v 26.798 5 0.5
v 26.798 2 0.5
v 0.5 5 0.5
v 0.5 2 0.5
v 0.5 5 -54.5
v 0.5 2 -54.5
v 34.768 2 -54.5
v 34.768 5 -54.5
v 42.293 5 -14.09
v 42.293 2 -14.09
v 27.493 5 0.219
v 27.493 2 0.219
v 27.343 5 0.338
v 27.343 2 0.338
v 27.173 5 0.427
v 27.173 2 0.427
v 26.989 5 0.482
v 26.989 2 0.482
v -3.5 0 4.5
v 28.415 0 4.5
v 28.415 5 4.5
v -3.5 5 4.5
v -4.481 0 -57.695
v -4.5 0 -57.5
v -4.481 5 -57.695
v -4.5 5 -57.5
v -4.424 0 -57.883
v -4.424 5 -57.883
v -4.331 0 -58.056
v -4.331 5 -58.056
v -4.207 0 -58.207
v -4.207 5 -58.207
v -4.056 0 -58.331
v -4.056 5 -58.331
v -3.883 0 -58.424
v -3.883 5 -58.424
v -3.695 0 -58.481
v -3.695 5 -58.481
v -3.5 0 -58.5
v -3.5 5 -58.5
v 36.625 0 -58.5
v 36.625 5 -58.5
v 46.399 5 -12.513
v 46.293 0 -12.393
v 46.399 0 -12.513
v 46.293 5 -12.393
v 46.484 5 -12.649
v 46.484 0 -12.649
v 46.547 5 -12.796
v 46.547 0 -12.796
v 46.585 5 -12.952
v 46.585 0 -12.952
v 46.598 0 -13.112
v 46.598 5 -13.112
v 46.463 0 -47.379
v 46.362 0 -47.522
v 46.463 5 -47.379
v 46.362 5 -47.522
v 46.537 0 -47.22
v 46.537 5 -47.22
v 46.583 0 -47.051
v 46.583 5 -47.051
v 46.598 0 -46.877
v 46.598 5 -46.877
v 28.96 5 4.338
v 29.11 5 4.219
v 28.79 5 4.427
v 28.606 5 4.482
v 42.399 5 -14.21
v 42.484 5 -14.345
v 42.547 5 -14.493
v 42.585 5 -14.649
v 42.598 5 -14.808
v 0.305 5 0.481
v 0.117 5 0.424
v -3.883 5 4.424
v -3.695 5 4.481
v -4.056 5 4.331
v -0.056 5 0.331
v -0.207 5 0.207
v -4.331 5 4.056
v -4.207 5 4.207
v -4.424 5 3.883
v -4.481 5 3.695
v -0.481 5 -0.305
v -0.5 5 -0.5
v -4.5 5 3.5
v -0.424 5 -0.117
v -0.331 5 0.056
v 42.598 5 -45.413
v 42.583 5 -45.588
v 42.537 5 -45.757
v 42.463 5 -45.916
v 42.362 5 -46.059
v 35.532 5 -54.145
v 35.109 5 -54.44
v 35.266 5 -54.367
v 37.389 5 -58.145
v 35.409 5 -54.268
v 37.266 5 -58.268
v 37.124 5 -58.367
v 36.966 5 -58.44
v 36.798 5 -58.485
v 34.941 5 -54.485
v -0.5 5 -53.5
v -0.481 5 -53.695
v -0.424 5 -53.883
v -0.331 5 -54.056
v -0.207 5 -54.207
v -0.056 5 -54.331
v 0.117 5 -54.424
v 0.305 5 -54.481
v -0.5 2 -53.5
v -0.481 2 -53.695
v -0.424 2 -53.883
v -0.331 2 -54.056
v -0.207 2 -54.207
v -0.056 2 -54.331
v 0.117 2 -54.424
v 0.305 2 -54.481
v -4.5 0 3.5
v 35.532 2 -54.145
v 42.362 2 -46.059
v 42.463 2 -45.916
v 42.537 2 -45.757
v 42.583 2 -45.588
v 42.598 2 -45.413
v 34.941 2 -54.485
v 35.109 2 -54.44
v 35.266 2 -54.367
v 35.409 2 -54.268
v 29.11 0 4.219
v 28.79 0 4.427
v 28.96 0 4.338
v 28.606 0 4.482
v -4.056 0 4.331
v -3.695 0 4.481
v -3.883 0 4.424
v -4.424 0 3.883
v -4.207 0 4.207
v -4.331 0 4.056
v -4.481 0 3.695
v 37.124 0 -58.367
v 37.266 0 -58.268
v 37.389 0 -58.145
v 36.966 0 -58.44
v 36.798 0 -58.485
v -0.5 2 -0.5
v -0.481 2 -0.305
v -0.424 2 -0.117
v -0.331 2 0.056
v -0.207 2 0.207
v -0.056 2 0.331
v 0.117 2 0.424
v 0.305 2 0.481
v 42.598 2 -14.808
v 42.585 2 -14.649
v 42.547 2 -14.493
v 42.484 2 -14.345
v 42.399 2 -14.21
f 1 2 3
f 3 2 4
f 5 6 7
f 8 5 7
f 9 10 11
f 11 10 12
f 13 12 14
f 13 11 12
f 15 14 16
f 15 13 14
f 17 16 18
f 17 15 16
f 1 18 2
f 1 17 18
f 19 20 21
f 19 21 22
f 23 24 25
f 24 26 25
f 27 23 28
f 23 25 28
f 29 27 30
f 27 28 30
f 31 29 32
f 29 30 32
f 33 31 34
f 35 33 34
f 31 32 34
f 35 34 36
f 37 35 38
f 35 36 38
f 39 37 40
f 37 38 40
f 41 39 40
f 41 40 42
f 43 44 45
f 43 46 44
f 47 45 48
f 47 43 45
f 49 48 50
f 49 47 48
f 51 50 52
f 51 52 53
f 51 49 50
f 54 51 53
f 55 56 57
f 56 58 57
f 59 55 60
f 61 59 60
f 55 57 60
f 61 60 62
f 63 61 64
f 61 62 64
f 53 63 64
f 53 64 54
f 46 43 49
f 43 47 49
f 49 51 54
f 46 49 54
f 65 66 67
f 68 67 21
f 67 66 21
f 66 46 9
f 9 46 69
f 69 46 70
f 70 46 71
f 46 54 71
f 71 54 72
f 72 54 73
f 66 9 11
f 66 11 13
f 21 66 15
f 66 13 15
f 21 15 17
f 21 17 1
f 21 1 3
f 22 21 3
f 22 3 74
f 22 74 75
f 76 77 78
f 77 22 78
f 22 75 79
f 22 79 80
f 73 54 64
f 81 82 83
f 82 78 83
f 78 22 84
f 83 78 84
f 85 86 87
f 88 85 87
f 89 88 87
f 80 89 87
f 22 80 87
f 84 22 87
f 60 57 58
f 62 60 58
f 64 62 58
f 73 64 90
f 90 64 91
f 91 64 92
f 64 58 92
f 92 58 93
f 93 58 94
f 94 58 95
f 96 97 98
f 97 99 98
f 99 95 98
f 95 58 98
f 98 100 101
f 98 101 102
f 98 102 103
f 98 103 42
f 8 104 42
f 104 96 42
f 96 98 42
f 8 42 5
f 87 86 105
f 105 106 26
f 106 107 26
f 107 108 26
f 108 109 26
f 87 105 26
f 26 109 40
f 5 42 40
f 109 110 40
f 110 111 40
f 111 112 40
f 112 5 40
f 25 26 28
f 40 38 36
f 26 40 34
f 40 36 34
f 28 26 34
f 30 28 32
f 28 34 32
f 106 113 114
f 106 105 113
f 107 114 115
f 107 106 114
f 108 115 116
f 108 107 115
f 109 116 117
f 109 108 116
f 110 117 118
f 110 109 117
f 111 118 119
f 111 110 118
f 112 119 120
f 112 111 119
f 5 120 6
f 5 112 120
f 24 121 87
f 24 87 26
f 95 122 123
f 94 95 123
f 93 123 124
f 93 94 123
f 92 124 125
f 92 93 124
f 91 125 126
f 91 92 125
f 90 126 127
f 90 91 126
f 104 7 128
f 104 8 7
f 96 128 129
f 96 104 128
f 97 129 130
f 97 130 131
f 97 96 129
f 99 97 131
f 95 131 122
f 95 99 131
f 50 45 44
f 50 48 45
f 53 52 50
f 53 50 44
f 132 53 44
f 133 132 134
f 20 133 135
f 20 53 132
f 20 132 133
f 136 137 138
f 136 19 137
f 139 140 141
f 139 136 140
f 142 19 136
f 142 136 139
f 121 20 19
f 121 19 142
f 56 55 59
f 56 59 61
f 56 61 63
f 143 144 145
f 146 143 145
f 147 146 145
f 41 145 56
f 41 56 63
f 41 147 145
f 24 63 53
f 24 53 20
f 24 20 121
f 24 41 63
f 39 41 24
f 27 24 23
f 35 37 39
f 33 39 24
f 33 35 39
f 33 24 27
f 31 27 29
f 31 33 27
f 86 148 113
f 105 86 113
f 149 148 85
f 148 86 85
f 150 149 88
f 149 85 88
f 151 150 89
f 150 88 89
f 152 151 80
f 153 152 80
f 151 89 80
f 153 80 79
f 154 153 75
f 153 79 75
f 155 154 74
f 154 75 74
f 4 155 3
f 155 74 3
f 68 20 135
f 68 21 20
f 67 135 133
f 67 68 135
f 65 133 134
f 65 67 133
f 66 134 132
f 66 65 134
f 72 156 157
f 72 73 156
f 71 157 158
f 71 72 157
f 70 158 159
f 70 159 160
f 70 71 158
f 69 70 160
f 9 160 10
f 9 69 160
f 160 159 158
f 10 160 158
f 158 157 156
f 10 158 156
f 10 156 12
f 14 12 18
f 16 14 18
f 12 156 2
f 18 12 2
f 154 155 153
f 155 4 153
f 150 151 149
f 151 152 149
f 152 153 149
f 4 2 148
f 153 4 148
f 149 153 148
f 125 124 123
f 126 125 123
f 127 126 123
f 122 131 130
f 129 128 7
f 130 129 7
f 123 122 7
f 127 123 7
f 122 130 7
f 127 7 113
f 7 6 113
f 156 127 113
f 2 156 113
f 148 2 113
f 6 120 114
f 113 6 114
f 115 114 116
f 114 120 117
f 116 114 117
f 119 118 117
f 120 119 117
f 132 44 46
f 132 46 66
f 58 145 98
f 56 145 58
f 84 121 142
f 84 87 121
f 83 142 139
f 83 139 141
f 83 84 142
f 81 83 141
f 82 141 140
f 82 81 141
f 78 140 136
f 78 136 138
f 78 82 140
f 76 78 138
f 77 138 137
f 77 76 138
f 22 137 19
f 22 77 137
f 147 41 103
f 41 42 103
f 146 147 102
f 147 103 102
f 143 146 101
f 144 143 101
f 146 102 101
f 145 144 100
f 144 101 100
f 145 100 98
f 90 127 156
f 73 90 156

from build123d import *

# Parameters (mm, degrees)
BOSS_EXTRUDE1_DEPTH = 5
BOSS_EXTRUDE2_DEPTH = 2
FILLET1_R           = 1


with BuildPart() as part:
    # Sketch1 → Boss-Extrude1 (new body)
    with BuildSketch(Plane(origin=(0, 0, 0), x_dir=(1, 0, 0), z_dir=(0, 1, 0))):
        Polygon((-4.5, -4.5), (-4.5, 58.5), (37.089540976, 58.5), (46.597851618, 47.242502808), (46.597851618, 12.6877701), (28.819604063, -4.5), align=None)
        Polygon((-0.5, -0.5), (-0.5, 54.5), (35.23217122, 54.5), (42.597851618, 45.779299812), (42.597851618, 14.384329511), (27.202178229, -0.5), align=None, mode=Mode.SUBTRACT)
    extrude(amount=BOSS_EXTRUDE1_DEPTH)

    # Sketch1_2 → Boss-Extrude2 (add)
    with BuildSketch(Plane(origin=(0, 0, 0), x_dir=(1, 0, 0), z_dir=(0, 1, 0))):
        Polygon((27.202178229, -0.5), (-0.5, -0.5), (-0.5, 54.5), (35.23217122, 54.5), (42.597851618, 45.779299812), (42.597851618, 14.384329511), align=None)
    extrude(amount=BOSS_EXTRUDE2_DEPTH)

    # Fillet1
    fillet1_edges = [part.edges().sort_by_distance(p)[0] for p in [
        (-4.5, 2.5, 4.5),
        (-4.5, 2.5, -58.5),
        (37.089540976, 2.5, -58.5),
        (46.597851618, 2.5, -47.242502808),
        (46.597851618, 2.5, -12.6877701),
        (28.819604063, 2.5, 4.5),
        (-0.5, 3.5, 0.5),
        (27.202178229, 3.5, 0.5),
        (42.597851618, 3.5, -14.384329511),
        (42.597851618, 3.5, -45.779299812),
        (35.23217122, 3.5, -54.5),
        (-0.5, 3.5, -54.5),
    ]]
    fillet(fillet1_edges, radius=FILLET1_R)


solid = part.part
